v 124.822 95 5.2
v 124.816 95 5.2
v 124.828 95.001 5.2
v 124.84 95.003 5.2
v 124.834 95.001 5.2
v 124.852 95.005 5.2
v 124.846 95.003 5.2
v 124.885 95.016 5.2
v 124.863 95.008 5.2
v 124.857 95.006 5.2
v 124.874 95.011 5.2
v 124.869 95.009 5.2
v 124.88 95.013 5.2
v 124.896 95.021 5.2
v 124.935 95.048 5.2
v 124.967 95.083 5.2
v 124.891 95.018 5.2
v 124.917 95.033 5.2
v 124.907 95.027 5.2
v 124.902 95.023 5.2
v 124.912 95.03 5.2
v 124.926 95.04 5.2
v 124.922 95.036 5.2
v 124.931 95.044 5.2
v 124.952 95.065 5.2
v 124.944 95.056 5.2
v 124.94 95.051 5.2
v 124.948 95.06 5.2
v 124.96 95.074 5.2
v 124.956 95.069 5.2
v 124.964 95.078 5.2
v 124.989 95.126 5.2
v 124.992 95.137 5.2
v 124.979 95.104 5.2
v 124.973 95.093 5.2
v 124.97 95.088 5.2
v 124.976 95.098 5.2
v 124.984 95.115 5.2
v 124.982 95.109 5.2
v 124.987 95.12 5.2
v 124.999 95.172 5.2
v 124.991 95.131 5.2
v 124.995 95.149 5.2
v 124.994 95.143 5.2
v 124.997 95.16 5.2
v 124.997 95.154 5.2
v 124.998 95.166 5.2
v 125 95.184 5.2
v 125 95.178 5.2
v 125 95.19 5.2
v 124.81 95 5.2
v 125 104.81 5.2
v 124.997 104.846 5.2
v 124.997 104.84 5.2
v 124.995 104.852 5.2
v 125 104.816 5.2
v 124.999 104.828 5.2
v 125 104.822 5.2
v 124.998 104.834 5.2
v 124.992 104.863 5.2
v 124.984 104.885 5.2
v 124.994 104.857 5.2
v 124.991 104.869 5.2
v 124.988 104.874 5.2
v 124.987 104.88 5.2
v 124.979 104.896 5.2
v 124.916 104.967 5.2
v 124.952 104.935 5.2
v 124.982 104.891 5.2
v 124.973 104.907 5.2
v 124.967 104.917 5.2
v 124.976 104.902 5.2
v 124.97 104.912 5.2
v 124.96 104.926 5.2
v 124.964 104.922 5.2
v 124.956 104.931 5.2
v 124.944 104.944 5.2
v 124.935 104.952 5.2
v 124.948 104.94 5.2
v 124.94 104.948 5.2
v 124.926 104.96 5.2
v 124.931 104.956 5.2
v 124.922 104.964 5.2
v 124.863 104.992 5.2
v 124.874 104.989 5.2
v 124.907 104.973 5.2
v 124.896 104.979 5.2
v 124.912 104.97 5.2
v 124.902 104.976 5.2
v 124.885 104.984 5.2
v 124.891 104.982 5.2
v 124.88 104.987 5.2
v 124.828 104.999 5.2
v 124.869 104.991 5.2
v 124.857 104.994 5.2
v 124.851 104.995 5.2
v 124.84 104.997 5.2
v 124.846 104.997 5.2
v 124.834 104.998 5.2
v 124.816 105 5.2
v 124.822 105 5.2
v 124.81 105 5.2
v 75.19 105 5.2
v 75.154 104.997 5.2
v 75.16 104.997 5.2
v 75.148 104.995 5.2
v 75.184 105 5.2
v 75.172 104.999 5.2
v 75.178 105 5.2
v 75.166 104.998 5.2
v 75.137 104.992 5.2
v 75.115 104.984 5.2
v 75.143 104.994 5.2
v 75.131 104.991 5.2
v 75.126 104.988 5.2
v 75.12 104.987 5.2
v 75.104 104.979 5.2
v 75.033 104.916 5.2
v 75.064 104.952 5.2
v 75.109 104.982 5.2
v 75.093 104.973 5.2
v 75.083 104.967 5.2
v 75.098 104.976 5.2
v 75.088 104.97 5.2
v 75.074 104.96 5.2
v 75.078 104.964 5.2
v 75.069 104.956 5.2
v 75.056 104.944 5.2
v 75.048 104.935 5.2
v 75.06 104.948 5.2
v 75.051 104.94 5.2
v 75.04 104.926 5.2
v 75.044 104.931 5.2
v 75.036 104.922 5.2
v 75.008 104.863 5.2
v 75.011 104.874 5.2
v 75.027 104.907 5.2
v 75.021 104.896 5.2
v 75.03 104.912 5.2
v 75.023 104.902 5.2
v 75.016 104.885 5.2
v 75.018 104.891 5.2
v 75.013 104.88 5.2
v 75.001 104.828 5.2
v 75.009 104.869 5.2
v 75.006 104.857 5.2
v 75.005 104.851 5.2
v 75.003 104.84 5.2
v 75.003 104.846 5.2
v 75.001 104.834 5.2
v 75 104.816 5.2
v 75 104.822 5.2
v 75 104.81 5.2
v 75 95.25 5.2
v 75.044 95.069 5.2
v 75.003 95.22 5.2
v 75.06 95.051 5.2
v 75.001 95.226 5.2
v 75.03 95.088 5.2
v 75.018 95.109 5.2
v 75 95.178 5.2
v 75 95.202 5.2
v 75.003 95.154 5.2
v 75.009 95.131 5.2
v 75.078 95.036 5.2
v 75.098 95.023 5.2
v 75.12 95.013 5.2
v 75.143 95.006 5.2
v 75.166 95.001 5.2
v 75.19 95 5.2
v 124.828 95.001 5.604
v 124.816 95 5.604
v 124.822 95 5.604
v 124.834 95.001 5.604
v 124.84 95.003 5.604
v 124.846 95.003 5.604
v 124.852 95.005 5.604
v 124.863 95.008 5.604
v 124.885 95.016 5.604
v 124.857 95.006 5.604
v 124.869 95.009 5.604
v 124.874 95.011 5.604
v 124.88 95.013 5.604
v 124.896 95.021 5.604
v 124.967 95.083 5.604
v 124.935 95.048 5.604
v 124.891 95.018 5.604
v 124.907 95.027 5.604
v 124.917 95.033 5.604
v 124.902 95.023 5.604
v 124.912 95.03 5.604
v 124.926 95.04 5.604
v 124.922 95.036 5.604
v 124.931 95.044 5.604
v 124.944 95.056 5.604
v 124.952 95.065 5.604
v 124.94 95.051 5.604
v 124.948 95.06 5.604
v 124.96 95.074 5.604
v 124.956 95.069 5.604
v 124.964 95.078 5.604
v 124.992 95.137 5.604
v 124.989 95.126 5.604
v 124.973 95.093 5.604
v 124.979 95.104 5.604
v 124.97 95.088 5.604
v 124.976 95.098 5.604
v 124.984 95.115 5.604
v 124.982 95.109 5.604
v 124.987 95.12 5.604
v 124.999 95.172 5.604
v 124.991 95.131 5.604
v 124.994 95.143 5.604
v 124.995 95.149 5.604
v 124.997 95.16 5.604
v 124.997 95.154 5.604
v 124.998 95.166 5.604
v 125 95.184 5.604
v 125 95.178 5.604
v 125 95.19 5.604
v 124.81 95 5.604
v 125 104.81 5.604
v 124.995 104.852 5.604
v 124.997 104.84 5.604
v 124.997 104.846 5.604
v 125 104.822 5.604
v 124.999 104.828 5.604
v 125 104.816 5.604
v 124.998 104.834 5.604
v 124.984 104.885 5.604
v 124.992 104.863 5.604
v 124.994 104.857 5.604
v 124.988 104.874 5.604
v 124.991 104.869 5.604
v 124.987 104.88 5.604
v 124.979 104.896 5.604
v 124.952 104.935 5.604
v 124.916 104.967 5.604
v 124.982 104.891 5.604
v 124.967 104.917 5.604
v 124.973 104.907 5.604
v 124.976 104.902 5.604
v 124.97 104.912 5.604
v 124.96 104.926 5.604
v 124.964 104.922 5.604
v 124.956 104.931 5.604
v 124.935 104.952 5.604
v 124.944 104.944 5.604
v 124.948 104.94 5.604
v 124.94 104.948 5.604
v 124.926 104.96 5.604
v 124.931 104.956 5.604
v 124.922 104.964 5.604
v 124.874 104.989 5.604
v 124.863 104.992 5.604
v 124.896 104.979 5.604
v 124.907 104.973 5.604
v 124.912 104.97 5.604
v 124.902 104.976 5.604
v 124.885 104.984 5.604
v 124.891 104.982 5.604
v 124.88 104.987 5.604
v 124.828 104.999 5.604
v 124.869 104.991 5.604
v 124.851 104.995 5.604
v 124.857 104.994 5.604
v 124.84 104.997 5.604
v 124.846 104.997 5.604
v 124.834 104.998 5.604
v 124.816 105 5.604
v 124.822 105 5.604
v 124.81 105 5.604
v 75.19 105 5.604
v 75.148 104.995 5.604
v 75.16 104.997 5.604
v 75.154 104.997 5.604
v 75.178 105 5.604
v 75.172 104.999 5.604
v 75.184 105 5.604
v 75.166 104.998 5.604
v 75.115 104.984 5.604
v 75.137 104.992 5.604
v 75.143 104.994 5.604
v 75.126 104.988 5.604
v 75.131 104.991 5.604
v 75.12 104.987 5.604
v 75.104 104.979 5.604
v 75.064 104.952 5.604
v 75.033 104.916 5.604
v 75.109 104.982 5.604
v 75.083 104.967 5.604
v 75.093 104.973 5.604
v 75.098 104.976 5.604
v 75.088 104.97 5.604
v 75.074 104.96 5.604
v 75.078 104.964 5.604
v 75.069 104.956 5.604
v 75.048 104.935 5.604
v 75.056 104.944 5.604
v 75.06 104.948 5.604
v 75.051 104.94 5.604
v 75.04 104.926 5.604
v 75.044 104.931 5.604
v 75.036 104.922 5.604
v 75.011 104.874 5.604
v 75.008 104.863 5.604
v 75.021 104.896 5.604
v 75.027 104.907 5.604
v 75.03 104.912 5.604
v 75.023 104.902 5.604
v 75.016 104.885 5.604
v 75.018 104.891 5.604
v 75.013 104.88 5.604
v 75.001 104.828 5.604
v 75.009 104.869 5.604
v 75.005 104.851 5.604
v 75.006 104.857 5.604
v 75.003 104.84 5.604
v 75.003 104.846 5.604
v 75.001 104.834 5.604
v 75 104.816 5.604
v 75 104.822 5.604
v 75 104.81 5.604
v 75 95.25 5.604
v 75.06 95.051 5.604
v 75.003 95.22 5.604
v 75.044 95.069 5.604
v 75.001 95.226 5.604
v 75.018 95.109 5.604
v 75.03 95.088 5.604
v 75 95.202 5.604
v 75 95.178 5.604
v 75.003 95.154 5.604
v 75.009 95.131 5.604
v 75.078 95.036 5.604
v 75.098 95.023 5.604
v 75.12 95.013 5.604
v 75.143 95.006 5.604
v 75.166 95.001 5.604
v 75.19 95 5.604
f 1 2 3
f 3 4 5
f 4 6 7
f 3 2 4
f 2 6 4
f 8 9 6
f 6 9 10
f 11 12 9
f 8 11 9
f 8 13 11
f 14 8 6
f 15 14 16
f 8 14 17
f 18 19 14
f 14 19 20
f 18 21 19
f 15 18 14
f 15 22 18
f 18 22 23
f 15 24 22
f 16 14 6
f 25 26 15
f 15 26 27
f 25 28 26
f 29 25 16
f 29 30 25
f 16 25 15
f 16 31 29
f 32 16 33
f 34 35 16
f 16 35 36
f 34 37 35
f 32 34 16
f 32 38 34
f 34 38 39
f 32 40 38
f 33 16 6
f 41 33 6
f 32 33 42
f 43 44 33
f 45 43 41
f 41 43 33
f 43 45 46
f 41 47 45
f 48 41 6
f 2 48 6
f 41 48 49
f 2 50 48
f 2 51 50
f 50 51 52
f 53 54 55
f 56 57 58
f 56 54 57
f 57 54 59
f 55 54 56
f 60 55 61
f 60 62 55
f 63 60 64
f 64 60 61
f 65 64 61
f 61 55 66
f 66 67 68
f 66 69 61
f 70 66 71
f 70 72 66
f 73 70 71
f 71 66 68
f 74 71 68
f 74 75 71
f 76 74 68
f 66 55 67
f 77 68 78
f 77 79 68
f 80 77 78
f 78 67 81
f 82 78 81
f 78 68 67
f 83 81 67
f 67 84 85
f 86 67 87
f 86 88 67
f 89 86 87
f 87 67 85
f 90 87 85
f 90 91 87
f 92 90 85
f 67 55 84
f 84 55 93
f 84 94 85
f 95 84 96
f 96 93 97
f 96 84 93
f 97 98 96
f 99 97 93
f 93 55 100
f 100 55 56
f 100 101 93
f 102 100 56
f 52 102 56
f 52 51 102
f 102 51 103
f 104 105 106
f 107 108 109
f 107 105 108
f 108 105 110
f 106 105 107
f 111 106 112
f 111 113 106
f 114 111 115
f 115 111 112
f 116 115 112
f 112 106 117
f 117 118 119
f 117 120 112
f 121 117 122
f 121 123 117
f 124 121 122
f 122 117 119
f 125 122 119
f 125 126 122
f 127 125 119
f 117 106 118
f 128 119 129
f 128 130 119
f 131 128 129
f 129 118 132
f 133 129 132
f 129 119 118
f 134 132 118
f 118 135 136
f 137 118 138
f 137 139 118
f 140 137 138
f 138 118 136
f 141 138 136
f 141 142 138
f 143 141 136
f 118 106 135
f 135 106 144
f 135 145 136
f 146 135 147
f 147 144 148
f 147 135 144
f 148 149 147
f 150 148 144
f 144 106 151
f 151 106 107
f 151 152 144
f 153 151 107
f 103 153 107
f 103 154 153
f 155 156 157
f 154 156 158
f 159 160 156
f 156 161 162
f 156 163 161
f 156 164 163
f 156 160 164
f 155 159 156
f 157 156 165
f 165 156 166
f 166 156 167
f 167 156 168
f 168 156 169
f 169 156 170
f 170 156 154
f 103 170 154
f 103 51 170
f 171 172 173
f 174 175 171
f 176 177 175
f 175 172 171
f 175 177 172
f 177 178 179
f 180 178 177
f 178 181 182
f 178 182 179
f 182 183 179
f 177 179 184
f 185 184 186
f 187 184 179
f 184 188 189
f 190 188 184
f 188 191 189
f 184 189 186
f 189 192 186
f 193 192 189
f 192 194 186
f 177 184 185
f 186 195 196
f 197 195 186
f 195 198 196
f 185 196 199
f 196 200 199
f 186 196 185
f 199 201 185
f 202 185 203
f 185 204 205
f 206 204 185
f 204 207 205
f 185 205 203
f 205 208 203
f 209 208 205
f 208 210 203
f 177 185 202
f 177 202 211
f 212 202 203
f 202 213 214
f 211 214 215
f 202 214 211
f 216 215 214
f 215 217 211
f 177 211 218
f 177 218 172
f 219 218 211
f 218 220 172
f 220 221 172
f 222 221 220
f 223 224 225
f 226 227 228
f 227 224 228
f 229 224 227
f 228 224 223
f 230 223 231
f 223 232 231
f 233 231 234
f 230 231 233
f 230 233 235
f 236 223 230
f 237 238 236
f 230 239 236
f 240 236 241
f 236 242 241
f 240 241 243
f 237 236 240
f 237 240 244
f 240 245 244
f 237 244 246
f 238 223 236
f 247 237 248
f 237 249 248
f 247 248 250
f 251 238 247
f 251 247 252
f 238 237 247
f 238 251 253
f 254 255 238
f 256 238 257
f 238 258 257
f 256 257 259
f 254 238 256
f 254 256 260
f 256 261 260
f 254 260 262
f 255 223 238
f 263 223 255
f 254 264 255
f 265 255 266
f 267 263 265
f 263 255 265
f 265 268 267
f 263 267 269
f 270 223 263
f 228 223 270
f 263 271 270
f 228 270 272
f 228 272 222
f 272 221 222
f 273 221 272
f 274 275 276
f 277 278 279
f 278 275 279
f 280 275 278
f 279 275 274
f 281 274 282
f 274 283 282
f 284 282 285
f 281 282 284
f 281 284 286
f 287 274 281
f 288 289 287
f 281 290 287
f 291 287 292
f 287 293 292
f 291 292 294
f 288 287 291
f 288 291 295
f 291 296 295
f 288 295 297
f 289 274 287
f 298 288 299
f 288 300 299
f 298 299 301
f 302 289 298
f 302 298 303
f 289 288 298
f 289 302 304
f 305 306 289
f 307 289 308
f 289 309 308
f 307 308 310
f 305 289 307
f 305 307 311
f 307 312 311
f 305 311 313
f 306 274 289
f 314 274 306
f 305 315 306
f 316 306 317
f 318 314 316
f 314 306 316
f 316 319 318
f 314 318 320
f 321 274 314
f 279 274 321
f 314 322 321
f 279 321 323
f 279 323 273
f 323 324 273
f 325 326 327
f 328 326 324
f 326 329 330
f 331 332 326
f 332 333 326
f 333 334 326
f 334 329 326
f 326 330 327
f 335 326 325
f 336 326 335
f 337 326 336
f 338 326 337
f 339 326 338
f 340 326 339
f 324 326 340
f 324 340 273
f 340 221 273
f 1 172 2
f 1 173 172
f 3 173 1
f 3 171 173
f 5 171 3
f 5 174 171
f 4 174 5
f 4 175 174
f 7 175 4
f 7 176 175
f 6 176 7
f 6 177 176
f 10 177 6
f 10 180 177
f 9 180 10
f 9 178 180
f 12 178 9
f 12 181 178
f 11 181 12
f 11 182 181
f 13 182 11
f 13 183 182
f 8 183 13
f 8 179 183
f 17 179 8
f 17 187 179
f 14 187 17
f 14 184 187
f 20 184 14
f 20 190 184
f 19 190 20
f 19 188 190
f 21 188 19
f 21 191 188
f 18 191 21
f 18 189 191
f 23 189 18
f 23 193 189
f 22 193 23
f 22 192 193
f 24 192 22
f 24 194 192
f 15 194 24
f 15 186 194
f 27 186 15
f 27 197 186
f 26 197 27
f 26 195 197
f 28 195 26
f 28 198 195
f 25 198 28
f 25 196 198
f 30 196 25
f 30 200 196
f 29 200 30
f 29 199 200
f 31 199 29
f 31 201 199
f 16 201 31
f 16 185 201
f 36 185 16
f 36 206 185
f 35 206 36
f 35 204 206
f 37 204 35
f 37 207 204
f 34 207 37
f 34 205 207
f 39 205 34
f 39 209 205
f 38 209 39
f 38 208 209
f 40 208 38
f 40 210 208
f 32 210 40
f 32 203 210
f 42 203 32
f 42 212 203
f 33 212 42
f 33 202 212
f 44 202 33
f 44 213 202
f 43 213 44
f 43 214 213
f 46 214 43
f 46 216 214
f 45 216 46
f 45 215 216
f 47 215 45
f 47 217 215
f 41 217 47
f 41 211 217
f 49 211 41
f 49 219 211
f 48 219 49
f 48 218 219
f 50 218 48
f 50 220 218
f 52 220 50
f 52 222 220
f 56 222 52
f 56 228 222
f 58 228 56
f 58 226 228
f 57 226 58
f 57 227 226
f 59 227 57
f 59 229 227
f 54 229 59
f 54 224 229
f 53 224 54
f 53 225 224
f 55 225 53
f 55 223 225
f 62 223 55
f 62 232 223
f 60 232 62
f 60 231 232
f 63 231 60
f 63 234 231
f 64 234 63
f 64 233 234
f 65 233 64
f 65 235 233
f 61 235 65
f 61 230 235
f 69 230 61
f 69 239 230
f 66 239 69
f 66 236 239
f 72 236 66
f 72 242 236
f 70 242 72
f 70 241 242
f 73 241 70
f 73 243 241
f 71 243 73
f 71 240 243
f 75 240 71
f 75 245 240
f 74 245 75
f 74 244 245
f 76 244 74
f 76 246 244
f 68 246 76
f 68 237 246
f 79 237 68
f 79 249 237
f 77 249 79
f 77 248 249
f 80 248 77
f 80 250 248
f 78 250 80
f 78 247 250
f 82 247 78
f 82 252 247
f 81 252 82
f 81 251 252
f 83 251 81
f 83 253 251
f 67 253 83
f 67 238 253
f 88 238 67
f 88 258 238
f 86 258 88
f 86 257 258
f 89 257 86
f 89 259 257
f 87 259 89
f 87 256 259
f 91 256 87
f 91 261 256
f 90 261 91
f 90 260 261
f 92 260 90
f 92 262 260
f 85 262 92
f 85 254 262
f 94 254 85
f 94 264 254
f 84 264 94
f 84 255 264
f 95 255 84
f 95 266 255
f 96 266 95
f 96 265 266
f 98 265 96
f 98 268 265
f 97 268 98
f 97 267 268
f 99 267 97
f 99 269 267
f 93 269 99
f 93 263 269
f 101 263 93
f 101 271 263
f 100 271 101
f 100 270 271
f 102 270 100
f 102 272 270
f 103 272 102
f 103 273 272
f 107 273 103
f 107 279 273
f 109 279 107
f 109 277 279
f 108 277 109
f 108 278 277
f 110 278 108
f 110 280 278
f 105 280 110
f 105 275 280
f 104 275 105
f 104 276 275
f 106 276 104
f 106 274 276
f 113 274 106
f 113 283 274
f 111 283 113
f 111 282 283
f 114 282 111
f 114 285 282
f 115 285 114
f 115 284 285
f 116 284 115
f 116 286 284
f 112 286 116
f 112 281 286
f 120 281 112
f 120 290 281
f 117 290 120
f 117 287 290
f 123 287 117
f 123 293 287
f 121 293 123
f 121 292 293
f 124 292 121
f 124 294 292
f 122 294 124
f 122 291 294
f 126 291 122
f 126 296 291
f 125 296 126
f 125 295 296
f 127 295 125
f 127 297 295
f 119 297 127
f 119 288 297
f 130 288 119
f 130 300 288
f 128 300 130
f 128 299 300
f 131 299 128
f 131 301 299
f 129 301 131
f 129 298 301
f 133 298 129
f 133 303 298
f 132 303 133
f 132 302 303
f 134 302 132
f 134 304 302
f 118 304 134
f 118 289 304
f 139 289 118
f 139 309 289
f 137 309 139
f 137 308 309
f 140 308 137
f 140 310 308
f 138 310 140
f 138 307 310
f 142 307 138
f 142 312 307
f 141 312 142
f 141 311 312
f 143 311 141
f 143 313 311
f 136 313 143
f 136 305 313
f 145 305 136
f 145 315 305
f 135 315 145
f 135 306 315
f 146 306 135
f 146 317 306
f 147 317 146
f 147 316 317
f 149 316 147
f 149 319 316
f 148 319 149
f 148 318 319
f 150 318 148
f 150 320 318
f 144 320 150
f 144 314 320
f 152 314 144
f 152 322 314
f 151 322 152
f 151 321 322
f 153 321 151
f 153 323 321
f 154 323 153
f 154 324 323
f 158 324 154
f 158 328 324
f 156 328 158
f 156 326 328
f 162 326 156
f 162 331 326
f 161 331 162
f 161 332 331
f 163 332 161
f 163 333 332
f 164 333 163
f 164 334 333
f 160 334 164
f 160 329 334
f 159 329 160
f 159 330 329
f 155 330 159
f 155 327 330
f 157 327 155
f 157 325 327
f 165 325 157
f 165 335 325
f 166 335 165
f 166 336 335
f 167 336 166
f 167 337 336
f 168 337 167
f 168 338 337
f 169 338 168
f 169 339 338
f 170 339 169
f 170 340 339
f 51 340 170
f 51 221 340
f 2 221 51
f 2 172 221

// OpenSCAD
module drawBasicShape(x1, y1, x2, y2, width)
{
	length = sqrt((x1-x2)*(x1-x2) + (y1-y2)*(y1-y2));
	if (width!=0.0) {
		square(size = [width, length], center = false);
		translate([width/2.0, 0, 0]) circle(d=width);
		translate([width/2.0, length, 0]) circle(d=width);
	}
}

module translateAndRotate(x1, y1, x2, y2, width)
{
	if (width != 0.0) {
		angle = atan((y2-y1)/(x2-x1)) +270;
		if (x2>=x1) {
			translate([x1, y1, 0.0]) rotate([0.0, 0.0, angle]) translate([-width/2.0, 0.0, 0.0]) scale([1.0, 1.0, 1.0]) drawBasicShape(x1, y1, x2, y2, width);
		}
		else {
			translate([x1, y1, 0.0]) rotate([0.0, 0.0, angle+180]) translate([-width/2.0, 0.0, 0.0]) scale([1.0, 1.0, 1.0]) drawBasicShape(x1, y1, x2, y2, width);		}
	}
}

$fn=50;

points12 = [
[75.77800000, 95.77800000, 0.00000000],
[124.22200000, 95.77800000, 0.37999548],
[124.22200000, 104.22200000, 0.37997788],
[75.77800000, 104.22200000, 0.37999672],
[75.77800000, 95.83800000, 0.37997423],
[75.48400000, 95.48400000, 0.00000000],
[124.51600000, 95.48400000, 0.37999868],
[124.51600000, 104.51600000, 0.37998977],
[75.48400000, 104.51600000, 0.37999746],
[75.48400000, 95.54400000, 0.37999314],
[75.19000000, 95.19000000, 0.00000000],
[124.81000000, 95.19000000, 0.37999939],
[124.81000000, 104.81000000, 0.38000021],
[75.19000000, 104.81000000, 0.38000060],
[75.19000000, 95.25000000, 0.37999715],
[75.53600000, 95.39000000, 0.00000000],
[75.94600000, 103.88900000, 0.00000000],
[76.11100000, 104.05400000, 0.37961375],
[76.52800000, 104.05400000, 0.38001190],
[75.94600000, 103.47200000, 0.37989934],
[75.94600000, 103.05500000, 0.38001190],
[76.94500000, 104.05400000, 0.37998907],
[77.36200000, 104.05400000, 0.38001190],
[75.94600000, 102.63800000, 0.37999592],
[75.94600000, 102.22100000, 0.38001190],
[77.77900000, 104.05400000, 0.37999966],
[78.19600000, 104.05400000, 0.38001190],
[75.94600000, 101.80400000, 0.38002091],
[75.94600000, 101.38700000, 0.38001190],
[78.61300000, 104.05400000, 0.38001957],
[79.03000000, 104.05400000, 0.38001190],
[75.94600000, 100.97000000, 0.38001859],
[75.94600000, 100.55300000, 0.38001190],
[79.44700000, 104.05400000, 0.38002999],
[79.86400000, 104.05400000, 0.38001190],
[75.94600000, 100.13600000, 0.38002811],
[75.94600000, 99.71900000, 0.38001190],
[80.28100000, 104.05400000, 0.38002660],
[80.69800000, 104.05400000, 0.38001190],
[75.94600000, 99.30200000, 0.38002534],
[75.94600000, 98.88500000, 0.38015610],
[81.11500000, 104.05400000, 0.38002430],
[81.53300000, 104.05400000, 0.37945200],
[75.94600000, 98.46700000, 0.37997836],
[75.94600000, 98.05000000, 0.38001190],
[81.95000000, 104.05400000, 0.37998072],
[82.36700000, 104.05400000, 0.38001190],
[75.94600000, 97.63300000, 0.37998939],
[75.94600000, 97.21600000, 0.38001190],
[82.78400000, 104.05400000, 0.37999079],
[83.20100000, 104.05400000, 0.38015610],
[75.94600000, 96.79900000, 0.37999203],
[75.94600000, 96.38200000, 0.38001190],
[83.61800000, 104.05400000, 0.37999868],
[84.03500000, 104.05400000, 0.38001190],
[75.95600000, 95.97600000, 0.38000275],
[76.34400000, 95.94600000, 0.37958004],
[84.45200000, 104.05400000, 0.38000229],
[84.86900000, 104.05400000, 0.38015610],
[76.76100000, 95.94600000, 0.38000229],
[77.17800000, 95.94600000, 0.38001190],
[85.28600000, 104.05400000, 0.38000754],
[85.70300000, 104.05400000, 0.38001190],
[77.59500000, 95.94600000, 0.38000229],
[78.01200000, 95.94600000, 0.38001190],
[86.12000000, 104.05400000, 0.38000754],
[86.53700000, 104.05400000, 0.38001190],
[78.42900000, 95.94600000, 0.38000229],
[78.84600000, 95.94600000, 0.38015610],
[86.95400000, 104.05400000, 0.38000229],
[87.37100000, 104.05400000, 0.38001190],
[79.26300000, 95.94600000, 0.38000754],
[79.68000000, 95.94600000, 0.38001190],
[87.78900000, 104.05400000, 0.37998415],
[88.20600000, 104.05400000, 0.38001190],
[80.09700000, 95.94600000, 0.37998940],
[80.51500000, 95.94600000, 0.37930814],
[88.62300000, 104.05400000, 0.38000229],
[89.04000000, 104.05400000, 0.38015610],
[80.93200000, 95.94600000, 0.38000229],
[81.34900000, 95.94600000, 0.38001190],
[89.45700000, 104.05400000, 0.38000754],
[89.87400000, 104.05400000, 0.38001190],
[81.76600000, 95.94600000, 0.38000229],
[82.18300000, 95.94600000, 0.38001190],
[90.29100000, 104.05400000, 0.38000754],
[90.70800000, 104.05400000, 0.38001190],
[82.60000000, 95.94600000, 0.38000229],
[83.01700000, 95.94600000, 0.38015610],
[91.12500000, 104.05400000, 0.38000229],
[91.54200000, 104.05400000, 0.38001190],
[83.43400000, 95.94600000, 0.38000754],
[83.85100000, 95.94600000, 0.38001190],
[91.95900000, 104.05400000, 0.38000229],
[92.37600000, 104.05400000, 0.38001190],
[84.26800000, 95.94600000, 0.38000754],
[84.68500000, 95.94600000, 0.38001190],
[92.79300000, 104.05400000, 0.38000229],
[93.21000000, 104.05400000, 0.38015610],
[85.10200000, 95.94600000, 0.38000229],
[85.51900000, 95.94600000, 0.38001190],
[93.62700000, 104.05400000, 0.38000229],
[94.04400000, 104.05400000, 0.38015610],
[85.93600000, 95.94600000, 0.38000229],
[86.35300000, 95.94600000, 0.38001190],
[94.46200000, 104.05400000, 0.37998940],
[94.87900000, 104.05400000, 0.38001190],
[86.77000000, 95.94600000, 0.37998415],
[87.18800000, 95.94600000, 0.37945200],
[95.29600000, 104.05400000, 0.38000229],
[95.71300000, 104.05400000, 0.38001190],
[87.60500000, 95.94600000, 0.38000229],
[88.02200000, 95.94600000, 0.38015610],
[96.13000000, 104.05400000, 0.38000229],
[96.54700000, 104.05400000, 0.38001190],
[88.43900000, 95.94600000, 0.38000754],
[88.85600000, 95.94600000, 0.38001190],
[96.96400000, 104.05400000, 0.38000229],
[97.38100000, 104.05400000, 0.38001190],
[89.27300000, 95.94600000, 0.38000754],
[89.69000000, 95.94600000, 0.38001190],
[97.79800000, 104.05400000, 0.38000229],
[98.21500000, 104.05400000, 0.38015610],
[90.10700000, 95.94600000, 0.38000229],
[90.52400000, 95.94600000, 0.38001190],
[98.63200000, 104.05400000, 0.38000754],
[99.04900000, 104.05400000, 0.38001190],
[90.94100000, 95.94600000, 0.38000229],
[91.35800000, 95.94600000, 0.38001190],
[99.46600000, 104.05400000, 0.38000754],
[99.88300000, 104.05400000, 0.38001190],
[91.77500000, 95.94600000, 0.38000229],
[92.19200000, 95.94600000, 0.38015610],
[100.30000000, 104.05400000, 0.38000229],
[100.71800000, 104.05400000, 0.37930814],
[92.60900000, 95.94600000, 0.37998940],
[93.02600000, 95.94600000, 0.38001190],
[101.13500000, 104.05400000, 0.37998415],
[101.55200000, 104.05400000, 0.38001190],
[93.44400000, 95.94600000, 0.38000754],
[93.86100000, 95.94600000, 0.38001190],
[101.96900000, 104.05400000, 0.38000229],
[102.38600000, 104.05400000, 0.38015610],
[94.27800000, 95.94600000, 0.38000229],
[94.69500000, 95.94600000, 0.38001190],
[102.80300000, 104.05400000, 0.38000754],
[103.22000000, 104.05400000, 0.38001190],
[95.11200000, 95.94600000, 0.38000229],
[95.52900000, 95.94600000, 0.38001190],
[103.63700000, 104.05400000, 0.38000754],
[104.05400000, 104.05400000, 0.38001190],
[95.94600000, 95.94600000, 0.38000229],
[96.36300000, 95.94600000, 0.38015610],
[104.47100000, 104.05400000, 0.38000229],
[104.88800000, 104.05400000, 0.38001190],
[96.78000000, 95.94600000, 0.38000754],
[97.19700000, 95.94600000, 0.38001190],
[105.30500000, 104.05400000, 0.38000229],
[105.72200000, 104.05400000, 0.38001190],
[97.61400000, 95.94600000, 0.38000754],
[98.03100000, 95.94600000, 0.38001190],
[106.13900000, 104.05400000, 0.38000229],
[106.55600000, 104.05400000, 0.38015610],
[98.44800000, 95.94600000, 0.38000229],
[98.86500000, 95.94600000, 0.38001190],
[106.97300000, 104.05400000, 0.38000754],
[107.39100000, 104.05400000, 0.37930814],
[99.28200000, 95.94600000, 0.37998415],
[99.69900000, 95.94600000, 0.38001190],
[107.80800000, 104.05400000, 0.37998940],
[108.22500000, 104.05400000, 0.38001190],
[100.11700000, 95.94600000, 0.38000229],
[100.53400000, 95.94600000, 0.38015610],
[108.64200000, 104.05400000, 0.38000229],
[109.05900000, 104.05400000, 0.38001190],
[100.95100000, 95.94600000, 0.38000229],
[101.36800000, 95.94600000, 0.38015610],
[109.47600000, 104.05400000, 0.38000229],
[109.89300000, 104.05400000, 0.38001190],
[101.78500000, 95.94600000, 0.38000754],
[102.20200000, 95.94600000, 0.38001190],
[110.31000000, 104.05400000, 0.38000229],
[110.72700000, 104.05400000, 0.38015610],
[102.61900000, 95.94600000, 0.38000229],
[103.03600000, 95.94600000, 0.38001190],
[111.14400000, 104.05400000, 0.38000229],
[111.56100000, 104.05400000, 0.38015610],
[103.45300000, 95.94600000, 0.38000229],
[103.87000000, 95.94600000, 0.38001190],
[111.97800000, 104.05400000, 0.38000754],
[112.39500000, 104.05400000, 0.38001190],
[104.28700000, 95.94600000, 0.38000229],
[104.70400000, 95.94600000, 0.38001190],
[112.81200000, 104.05400000, 0.38000754],
[113.22900000, 104.05400000, 0.38001190],
[105.12100000, 95.94600000, 0.38000229],
[105.53800000, 95.94600000, 0.38015610],
[113.64700000, 104.05400000, 0.37998415],
[114.06400000, 104.05400000, 0.38001190],
[105.95500000, 95.94600000, 0.37998940],
[106.37300000, 95.94600000, 0.37930814],
[114.48100000, 104.05400000, 0.38000229],
[114.89800000, 104.05400000, 0.38001190],
[106.79000000, 95.94600000, 0.38000754],
[107.20700000, 95.94600000, 0.38001190],
[115.31500000, 104.05400000, 0.38000229],
[115.73200000, 104.05400000, 0.38015610],
[107.62400000, 95.94600000, 0.38000229],
[108.04100000, 95.94600000, 0.38001190],
[116.14900000, 104.05400000, 0.38000754],
[116.56600000, 104.05400000, 0.38001190],
[108.45800000, 95.94600000, 0.38000229],
[108.87500000, 95.94600000, 0.38001190],
[116.98300000, 104.05400000, 0.38000754],
[117.40000000, 104.05400000, 0.38001190],
[109.29200000, 95.94600000, 0.38000229],
[109.70900000, 95.94600000, 0.38015610],
[117.81700000, 104.05400000, 0.38000229],
[118.23400000, 104.05400000, 0.38001190],
[110.12600000, 95.94600000, 0.38000754],
[110.54300000, 95.94600000, 0.38001190],
[118.65100000, 104.05400000, 0.38000229],
[119.06800000, 104.05400000, 0.38001190],
[110.96000000, 95.94600000, 0.38000754],
[111.37700000, 95.94600000, 0.38001190],
[119.48500000, 104.05400000, 0.38000229],
[119.90200000, 104.05400000, 0.38015610],
[111.79400000, 95.94600000, 0.38000229],
[112.21100000, 95.94600000, 0.38001190],
[120.32000000, 104.05400000, 0.37998415],
[120.73700000, 104.05400000, 0.38015610],
[112.62900000, 95.94600000, 0.38000229],
[113.04600000, 95.94600000, 0.38001190],
[121.15400000, 104.05400000, 0.38000754],
[121.57100000, 104.05400000, 0.38001190],
[113.46300000, 95.94600000, 0.38000229],
[113.88000000, 95.94600000, 0.38001190],
[121.98800000, 104.05400000, 0.38000754],
[122.40500000, 104.05400000, 0.38001190],
[114.29700000, 95.94600000, 0.38000229],
[114.71400000, 95.94600000, 0.38015610],
[122.82200000, 104.05400000, 0.38000229],
[123.23900000, 104.05400000, 0.38001190],
[115.13100000, 95.94600000, 0.38000754],
[115.54800000, 95.94600000, 0.38001190],
[123.65600000, 104.05400000, 0.38000229],
[124.04400000, 104.02500000, 0.37963728],
[115.96500000, 95.94600000, 0.37998455],
[116.38200000, 95.94600000, 0.38015610],
[124.05400000, 103.61800000, 0.37999868],
[124.05400000, 103.20100000, 0.38001190],
[116.79900000, 95.94600000, 0.37999789],
[117.21600000, 95.94600000, 0.38001190],
[124.05400000, 102.78400000, 0.37999079],
[124.05400000, 102.36700000, 0.38001190],
[117.63300000, 95.94600000, 0.37998939],
[118.05000000, 95.94600000, 0.38015610],
[124.05400000, 101.95000000, 0.37998072],
[124.05400000, 101.53300000, 0.38015610],
[118.46700000, 95.94600000, 0.37997836],
[118.88400000, 95.94600000, 0.38001190],
[124.05400000, 101.11600000, 0.37997562],
[124.05400000, 100.69800000, 0.37945200],
[119.30200000, 95.94600000, 0.38002534],
[119.71900000, 95.94600000, 0.38001190],
[124.05400000, 100.28100000, 0.38003640],
[124.05400000, 99.86400000, 0.38001190],
[120.13600000, 95.94600000, 0.38002811],
[120.55300000, 95.94600000, 0.38001190],
[124.05400000, 99.44700000, 0.38002999],
[124.05400000, 99.03000000, 0.38001190],
[120.97000000, 95.94600000, 0.38003238],
[121.38700000, 95.94600000, 0.38001190],
[124.05400000, 98.61300000, 0.38001957],
[124.05400000, 98.19600000, 0.38001190],
[121.80400000, 95.94600000, 0.38002091],
[122.22100000, 95.94600000, 0.38001190],
[124.05400000, 97.77900000, 0.38002285],
[124.05400000, 97.36200000, 0.38001190],
[122.63800000, 95.94600000, 0.37999592],
[123.05500000, 95.94600000, 0.38001190],
[124.05400000, 96.94500000, 0.37998907],
[124.05400000, 96.52800000, 0.38001190],
[123.47200000, 95.94600000, 0.37997240],
[123.88900000, 95.94600000, 0.38001190],
[124.05400000, 96.11100000, 0.37961375],
];

translate([0.0, 0.0, 5.20000000]) {
	linear_extrude(height = 0.40400000, center = false, convexity = 10, twist = 0) {
		union() {
			for( i=[0:len(points12)-2] ){ 
				x1 = points12[i][0];
				y1 = points12[i][1];
				x2 = points12[i+1][0];
				y2 = points12[i+1][1];
				width = points12[i+1][2];
				translateAndRotate(x1, y1, x2, y2, width);
			}
		}
	}
}
